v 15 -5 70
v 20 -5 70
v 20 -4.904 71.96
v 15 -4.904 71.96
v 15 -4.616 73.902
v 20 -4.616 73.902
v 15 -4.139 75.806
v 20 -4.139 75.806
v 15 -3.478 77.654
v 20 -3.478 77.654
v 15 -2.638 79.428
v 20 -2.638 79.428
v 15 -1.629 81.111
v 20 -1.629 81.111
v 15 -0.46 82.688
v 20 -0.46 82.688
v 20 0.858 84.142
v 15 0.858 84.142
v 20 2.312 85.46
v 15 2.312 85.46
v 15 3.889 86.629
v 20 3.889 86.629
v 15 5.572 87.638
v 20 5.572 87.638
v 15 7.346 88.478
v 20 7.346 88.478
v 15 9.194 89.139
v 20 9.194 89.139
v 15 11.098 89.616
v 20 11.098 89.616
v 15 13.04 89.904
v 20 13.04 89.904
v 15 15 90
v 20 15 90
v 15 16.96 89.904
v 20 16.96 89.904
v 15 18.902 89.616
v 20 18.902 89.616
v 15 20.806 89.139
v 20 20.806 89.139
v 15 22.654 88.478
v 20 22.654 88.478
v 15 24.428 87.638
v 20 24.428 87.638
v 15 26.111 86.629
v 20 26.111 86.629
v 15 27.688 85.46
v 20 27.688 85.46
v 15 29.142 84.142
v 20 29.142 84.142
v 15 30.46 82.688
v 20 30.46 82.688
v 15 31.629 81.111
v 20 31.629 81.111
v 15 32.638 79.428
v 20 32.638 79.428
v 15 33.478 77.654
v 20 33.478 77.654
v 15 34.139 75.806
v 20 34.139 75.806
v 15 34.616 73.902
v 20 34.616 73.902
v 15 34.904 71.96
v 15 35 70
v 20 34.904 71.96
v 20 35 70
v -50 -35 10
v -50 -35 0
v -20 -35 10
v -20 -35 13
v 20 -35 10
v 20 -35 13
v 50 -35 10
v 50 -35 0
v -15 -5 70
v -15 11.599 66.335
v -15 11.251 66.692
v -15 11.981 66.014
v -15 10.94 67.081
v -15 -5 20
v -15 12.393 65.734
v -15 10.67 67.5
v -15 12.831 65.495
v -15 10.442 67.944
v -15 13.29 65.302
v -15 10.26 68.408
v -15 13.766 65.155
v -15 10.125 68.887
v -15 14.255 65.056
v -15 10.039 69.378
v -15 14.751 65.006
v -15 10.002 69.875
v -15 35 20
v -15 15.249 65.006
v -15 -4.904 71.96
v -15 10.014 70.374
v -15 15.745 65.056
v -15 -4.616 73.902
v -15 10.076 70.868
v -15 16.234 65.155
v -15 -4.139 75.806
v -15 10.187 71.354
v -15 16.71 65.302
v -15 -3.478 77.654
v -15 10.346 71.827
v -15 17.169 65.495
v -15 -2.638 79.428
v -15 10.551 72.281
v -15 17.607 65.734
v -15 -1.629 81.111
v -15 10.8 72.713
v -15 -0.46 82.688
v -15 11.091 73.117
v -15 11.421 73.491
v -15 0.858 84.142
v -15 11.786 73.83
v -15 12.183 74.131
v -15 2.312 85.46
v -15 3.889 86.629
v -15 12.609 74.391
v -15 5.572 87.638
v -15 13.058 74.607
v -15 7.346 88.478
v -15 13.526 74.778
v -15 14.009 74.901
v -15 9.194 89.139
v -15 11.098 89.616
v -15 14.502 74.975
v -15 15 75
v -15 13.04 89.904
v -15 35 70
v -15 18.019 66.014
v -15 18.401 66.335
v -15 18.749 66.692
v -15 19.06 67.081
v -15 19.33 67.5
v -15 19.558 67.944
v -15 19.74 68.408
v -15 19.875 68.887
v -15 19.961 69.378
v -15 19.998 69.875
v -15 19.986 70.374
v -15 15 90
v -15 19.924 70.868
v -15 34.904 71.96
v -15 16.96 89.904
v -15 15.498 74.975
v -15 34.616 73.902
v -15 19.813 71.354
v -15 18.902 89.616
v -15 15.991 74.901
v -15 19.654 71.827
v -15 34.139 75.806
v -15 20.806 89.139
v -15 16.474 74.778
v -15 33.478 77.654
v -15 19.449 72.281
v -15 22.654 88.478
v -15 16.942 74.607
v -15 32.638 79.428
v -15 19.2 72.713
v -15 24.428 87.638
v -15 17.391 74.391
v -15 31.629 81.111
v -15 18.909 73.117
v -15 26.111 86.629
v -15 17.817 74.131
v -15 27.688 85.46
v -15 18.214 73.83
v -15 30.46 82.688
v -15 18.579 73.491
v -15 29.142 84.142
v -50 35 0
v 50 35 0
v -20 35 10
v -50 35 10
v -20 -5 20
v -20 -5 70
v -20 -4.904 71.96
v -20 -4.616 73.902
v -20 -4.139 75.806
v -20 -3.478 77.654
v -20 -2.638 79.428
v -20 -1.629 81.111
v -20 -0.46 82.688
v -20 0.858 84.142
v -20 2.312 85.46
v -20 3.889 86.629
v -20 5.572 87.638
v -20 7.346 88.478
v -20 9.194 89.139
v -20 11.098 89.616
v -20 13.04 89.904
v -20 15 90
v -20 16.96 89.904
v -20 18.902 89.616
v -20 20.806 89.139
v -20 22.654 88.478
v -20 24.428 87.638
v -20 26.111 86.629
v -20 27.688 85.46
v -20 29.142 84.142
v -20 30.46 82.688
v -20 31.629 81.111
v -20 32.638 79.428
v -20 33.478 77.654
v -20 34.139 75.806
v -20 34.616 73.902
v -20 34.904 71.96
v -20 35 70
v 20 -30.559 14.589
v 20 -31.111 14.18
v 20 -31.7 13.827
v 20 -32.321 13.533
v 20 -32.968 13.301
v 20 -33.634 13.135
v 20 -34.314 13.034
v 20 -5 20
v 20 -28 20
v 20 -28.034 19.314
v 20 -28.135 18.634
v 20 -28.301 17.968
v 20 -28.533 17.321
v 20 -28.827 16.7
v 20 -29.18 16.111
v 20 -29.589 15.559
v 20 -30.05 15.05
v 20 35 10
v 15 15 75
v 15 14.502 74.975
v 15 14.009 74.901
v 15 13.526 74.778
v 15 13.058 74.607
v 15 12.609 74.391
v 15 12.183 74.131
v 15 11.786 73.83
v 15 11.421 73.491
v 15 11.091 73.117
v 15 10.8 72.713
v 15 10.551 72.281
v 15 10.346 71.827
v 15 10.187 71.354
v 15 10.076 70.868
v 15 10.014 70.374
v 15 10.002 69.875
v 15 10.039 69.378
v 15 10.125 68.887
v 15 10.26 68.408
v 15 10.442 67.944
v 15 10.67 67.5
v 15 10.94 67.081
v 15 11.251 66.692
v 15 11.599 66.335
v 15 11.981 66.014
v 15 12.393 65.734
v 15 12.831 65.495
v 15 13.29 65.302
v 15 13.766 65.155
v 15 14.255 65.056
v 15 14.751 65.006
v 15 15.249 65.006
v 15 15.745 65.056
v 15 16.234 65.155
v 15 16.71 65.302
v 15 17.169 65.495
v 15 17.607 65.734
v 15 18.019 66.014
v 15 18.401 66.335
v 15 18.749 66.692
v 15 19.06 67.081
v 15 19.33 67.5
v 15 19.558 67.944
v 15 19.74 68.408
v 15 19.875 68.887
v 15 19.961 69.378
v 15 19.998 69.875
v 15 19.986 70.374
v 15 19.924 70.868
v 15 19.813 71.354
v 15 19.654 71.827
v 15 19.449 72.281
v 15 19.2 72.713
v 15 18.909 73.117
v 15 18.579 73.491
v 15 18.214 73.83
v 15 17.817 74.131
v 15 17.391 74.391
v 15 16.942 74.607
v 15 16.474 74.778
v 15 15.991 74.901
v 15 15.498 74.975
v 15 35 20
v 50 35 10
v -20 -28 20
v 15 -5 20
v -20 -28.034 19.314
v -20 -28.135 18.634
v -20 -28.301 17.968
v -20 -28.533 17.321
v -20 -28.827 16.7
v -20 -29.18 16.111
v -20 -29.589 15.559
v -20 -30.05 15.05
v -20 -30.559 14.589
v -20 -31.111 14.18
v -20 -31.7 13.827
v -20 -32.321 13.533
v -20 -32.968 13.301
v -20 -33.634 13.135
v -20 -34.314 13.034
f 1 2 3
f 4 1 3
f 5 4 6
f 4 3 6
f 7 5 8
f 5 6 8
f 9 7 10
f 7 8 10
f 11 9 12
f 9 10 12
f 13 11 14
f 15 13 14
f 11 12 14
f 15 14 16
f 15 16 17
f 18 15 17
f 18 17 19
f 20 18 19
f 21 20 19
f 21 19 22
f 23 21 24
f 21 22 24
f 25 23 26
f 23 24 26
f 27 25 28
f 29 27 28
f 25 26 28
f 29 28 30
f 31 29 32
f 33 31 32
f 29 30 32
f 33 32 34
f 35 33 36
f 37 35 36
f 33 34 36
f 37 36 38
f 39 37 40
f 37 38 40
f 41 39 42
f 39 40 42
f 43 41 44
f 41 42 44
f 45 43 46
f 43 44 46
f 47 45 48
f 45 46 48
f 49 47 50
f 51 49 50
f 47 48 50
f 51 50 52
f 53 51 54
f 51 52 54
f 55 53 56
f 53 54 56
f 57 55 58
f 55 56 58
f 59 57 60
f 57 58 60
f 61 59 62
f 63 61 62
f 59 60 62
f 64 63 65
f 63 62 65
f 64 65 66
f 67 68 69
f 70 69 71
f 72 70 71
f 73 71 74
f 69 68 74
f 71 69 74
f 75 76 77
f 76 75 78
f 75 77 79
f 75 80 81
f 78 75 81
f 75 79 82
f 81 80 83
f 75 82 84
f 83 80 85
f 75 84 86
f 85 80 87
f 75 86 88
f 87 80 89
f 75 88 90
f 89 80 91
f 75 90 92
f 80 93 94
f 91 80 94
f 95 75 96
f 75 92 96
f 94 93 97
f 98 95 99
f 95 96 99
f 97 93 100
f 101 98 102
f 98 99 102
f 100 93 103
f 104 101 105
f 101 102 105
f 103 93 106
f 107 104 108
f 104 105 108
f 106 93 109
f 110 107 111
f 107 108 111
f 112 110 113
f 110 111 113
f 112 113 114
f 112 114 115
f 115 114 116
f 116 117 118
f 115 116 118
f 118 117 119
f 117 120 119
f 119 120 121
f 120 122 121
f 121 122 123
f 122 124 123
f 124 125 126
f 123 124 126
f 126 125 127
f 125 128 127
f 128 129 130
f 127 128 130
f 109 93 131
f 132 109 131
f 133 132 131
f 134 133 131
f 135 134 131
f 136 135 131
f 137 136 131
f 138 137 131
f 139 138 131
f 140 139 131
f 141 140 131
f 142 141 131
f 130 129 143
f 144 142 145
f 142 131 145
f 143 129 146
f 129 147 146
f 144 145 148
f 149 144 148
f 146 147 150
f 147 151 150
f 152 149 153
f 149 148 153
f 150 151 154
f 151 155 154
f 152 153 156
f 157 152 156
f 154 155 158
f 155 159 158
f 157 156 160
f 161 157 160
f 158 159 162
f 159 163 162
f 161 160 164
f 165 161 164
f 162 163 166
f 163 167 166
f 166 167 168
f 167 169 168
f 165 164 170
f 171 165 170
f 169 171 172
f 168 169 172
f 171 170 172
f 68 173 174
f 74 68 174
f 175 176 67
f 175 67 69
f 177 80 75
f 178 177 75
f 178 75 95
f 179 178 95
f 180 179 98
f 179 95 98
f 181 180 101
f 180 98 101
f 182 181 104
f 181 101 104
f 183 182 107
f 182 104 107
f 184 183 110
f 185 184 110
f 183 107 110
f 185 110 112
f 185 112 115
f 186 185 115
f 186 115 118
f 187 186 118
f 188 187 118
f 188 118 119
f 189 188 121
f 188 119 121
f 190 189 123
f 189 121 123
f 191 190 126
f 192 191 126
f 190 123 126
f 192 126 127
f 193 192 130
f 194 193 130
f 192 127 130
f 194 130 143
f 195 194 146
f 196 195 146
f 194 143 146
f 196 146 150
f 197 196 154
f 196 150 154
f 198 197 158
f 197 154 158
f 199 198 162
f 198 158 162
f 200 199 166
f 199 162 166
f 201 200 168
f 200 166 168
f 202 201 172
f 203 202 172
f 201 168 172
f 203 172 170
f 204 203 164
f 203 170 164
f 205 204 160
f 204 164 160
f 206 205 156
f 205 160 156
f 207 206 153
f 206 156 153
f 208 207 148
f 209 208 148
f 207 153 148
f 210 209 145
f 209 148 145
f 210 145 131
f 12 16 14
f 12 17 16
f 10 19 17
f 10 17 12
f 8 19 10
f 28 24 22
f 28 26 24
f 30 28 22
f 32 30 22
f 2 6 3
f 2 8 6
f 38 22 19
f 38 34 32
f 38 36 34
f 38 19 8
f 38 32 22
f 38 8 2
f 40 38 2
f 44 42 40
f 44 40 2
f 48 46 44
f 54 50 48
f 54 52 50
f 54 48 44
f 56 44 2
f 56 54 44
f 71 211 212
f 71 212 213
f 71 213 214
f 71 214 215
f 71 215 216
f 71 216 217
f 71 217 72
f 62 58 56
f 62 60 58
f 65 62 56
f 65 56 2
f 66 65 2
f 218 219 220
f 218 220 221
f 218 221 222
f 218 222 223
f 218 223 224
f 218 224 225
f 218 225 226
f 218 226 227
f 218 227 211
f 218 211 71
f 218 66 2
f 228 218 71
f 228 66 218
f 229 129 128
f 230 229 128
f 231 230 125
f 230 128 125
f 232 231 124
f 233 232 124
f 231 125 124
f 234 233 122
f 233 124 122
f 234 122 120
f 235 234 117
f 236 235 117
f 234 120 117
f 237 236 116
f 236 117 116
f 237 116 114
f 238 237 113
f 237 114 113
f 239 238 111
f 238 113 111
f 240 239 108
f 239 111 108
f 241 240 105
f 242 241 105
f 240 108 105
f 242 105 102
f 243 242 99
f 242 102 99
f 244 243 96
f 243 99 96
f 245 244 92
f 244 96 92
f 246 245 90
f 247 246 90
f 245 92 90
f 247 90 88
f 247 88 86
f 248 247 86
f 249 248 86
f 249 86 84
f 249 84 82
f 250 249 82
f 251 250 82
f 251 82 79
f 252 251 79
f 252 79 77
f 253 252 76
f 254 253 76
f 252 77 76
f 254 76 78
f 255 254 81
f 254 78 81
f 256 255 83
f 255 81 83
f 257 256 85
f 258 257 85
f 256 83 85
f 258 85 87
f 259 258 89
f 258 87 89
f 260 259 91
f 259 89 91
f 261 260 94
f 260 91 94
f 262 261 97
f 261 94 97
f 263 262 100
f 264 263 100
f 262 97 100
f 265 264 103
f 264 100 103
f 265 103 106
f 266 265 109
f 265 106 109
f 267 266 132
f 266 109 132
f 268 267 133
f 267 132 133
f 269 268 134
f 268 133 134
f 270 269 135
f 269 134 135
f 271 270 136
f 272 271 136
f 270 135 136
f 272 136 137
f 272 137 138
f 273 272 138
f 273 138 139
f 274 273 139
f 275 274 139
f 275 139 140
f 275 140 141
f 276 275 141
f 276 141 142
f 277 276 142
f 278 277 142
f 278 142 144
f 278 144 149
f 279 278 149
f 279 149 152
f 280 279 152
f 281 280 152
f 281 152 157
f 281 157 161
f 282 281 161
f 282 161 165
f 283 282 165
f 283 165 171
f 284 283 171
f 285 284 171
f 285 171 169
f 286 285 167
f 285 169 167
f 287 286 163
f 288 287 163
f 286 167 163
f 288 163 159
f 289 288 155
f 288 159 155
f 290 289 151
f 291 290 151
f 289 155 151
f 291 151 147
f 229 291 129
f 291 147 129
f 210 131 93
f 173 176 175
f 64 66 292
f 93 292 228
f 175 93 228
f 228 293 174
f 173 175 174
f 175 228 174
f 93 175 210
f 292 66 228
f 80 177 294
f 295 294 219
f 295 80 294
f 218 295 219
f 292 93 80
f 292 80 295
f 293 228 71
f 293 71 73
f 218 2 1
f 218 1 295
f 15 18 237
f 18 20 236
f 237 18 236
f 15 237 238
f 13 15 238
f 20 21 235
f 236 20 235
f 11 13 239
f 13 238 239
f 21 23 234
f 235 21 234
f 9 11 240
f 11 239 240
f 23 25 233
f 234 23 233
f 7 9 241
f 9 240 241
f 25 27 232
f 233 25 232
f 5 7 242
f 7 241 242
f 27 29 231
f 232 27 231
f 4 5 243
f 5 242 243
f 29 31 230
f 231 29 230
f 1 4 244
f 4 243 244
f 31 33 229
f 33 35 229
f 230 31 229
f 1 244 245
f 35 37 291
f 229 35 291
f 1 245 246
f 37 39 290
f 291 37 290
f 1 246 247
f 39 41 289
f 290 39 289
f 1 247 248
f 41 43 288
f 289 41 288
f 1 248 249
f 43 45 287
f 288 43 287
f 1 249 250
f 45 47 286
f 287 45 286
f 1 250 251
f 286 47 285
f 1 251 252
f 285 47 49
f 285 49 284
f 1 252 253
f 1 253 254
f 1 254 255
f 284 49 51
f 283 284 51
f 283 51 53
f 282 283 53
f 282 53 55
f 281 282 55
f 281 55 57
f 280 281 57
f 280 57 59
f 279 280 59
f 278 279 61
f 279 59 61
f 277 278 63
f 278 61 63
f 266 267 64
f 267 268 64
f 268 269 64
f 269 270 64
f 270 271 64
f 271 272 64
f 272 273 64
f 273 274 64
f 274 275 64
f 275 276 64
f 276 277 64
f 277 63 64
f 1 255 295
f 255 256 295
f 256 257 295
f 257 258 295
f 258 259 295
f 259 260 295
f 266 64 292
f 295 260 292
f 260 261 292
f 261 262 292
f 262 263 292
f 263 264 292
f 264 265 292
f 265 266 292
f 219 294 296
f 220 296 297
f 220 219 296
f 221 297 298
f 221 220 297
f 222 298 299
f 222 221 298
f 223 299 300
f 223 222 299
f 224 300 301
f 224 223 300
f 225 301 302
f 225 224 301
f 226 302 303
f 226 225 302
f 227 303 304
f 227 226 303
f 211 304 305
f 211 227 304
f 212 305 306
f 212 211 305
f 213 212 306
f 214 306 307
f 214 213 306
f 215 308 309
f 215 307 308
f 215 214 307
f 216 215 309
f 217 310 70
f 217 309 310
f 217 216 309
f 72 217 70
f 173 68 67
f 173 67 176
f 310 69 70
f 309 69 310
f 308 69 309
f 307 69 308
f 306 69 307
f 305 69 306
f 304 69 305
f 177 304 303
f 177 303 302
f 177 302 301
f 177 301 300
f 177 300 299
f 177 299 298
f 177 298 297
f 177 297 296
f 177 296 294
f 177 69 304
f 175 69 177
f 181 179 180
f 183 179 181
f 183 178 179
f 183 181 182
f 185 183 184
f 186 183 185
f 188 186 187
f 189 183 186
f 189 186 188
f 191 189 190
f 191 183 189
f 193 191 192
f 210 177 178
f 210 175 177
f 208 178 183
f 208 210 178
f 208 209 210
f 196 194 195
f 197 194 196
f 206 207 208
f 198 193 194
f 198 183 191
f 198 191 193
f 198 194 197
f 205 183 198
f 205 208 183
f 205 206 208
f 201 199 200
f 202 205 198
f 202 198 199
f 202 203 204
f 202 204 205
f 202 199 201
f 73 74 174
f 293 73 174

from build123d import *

# Parameters (mm, degrees)
SKETCH_1_W          = 100
SKETCH_1_H          = 70
EXTRUDE_1_DEPTH     = 10
SKETCH_2_W          = 40
SKETCH_2_H          = 70
EXTRUDE_2_DEPTH     = 10
CUT_EXTRUDE_1_DEPTH = 81.777472107
SKETCH_4_W          = 50
SKETCH_4_H          = 40
EXTRUDE_3_DEPTH     = 5
EXTRUDE_START       = -5
SKETCH_5_W          = 50
SKETCH_5_H          = 40
EXTRUDE_4_DEPTH     = 5
SKETCH_6_R          = 5
EXTRUDE_5_DEPTH     = 30


with BuildPart() as part:
    # 草圖1 → 填料-伸長1 (new body)
    with BuildSketch(Plane.XY):
        Rectangle(SKETCH_1_W, SKETCH_1_H)
    extrude(amount=EXTRUDE_1_DEPTH)

    # 草圖2 → 填料-伸長2 (add)
    with BuildSketch(Plane.XY.offset(10)):
        Rectangle(SKETCH_2_W, SKETCH_2_H)
    extrude(amount=EXTRUDE_2_DEPTH)

    # 草圖3 → 除料-伸長1 (cut, through all)
    with BuildSketch(Plane(origin=(20, 0, 0), x_dir=(0, 0, -1), z_dir=(1, 0, 0))):
        with BuildLine():
            Line((-20, -35), (-20, -28))
            ThreePointArc((-20, -28), (-15.050252532, -30.050252532), (-13, -35))
            Line((-13, -35), (-20, -35))
        make_face()
    extrude(amount=-CUT_EXTRUDE_1_DEPTH, mode=Mode.SUBTRACT)

    # 草圖4 → 填料-伸長3 (add)
    with BuildSketch(Plane(origin=(20, 0, 0), x_dir=(0, 0, -1), z_dir=(1, 0, 0))):
        with Locations((-45, 15)):
            Rectangle(SKETCH_4_W, SKETCH_4_H)
        with BuildLine():
            Line((-70, 35), (-70, -5))
            ThreePointArc((-70, -5), (-90, 15), (-70, 35))
        make_face()
    extrude(amount=-EXTRUDE_3_DEPTH)

    # 草圖5 → 填料-伸長4 (add)
    with BuildSketch(Plane.ZY.offset(20).offset(EXTRUDE_START)):
        with Locations((45, 15)):
            Rectangle(SKETCH_5_W, SKETCH_5_H)
        with BuildLine():
            Line((70, 35), (70, -5))
            ThreePointArc((70, -5), (90, 15), (70, 35))
        make_face()
    extrude(amount=EXTRUDE_4_DEPTH)

    # 草圖6 → 填料-伸長5 (add)
    with BuildSketch(Plane(origin=(-15, 0, 0), x_dir=(0, 0, -1), z_dir=(1, 0, 0))):
        with Locations(Location((-70, 15, 0), (0, 0, 180))):
            Circle(SKETCH_6_R)
    extrude(amount=EXTRUDE_5_DEPTH)


solid = part.part
